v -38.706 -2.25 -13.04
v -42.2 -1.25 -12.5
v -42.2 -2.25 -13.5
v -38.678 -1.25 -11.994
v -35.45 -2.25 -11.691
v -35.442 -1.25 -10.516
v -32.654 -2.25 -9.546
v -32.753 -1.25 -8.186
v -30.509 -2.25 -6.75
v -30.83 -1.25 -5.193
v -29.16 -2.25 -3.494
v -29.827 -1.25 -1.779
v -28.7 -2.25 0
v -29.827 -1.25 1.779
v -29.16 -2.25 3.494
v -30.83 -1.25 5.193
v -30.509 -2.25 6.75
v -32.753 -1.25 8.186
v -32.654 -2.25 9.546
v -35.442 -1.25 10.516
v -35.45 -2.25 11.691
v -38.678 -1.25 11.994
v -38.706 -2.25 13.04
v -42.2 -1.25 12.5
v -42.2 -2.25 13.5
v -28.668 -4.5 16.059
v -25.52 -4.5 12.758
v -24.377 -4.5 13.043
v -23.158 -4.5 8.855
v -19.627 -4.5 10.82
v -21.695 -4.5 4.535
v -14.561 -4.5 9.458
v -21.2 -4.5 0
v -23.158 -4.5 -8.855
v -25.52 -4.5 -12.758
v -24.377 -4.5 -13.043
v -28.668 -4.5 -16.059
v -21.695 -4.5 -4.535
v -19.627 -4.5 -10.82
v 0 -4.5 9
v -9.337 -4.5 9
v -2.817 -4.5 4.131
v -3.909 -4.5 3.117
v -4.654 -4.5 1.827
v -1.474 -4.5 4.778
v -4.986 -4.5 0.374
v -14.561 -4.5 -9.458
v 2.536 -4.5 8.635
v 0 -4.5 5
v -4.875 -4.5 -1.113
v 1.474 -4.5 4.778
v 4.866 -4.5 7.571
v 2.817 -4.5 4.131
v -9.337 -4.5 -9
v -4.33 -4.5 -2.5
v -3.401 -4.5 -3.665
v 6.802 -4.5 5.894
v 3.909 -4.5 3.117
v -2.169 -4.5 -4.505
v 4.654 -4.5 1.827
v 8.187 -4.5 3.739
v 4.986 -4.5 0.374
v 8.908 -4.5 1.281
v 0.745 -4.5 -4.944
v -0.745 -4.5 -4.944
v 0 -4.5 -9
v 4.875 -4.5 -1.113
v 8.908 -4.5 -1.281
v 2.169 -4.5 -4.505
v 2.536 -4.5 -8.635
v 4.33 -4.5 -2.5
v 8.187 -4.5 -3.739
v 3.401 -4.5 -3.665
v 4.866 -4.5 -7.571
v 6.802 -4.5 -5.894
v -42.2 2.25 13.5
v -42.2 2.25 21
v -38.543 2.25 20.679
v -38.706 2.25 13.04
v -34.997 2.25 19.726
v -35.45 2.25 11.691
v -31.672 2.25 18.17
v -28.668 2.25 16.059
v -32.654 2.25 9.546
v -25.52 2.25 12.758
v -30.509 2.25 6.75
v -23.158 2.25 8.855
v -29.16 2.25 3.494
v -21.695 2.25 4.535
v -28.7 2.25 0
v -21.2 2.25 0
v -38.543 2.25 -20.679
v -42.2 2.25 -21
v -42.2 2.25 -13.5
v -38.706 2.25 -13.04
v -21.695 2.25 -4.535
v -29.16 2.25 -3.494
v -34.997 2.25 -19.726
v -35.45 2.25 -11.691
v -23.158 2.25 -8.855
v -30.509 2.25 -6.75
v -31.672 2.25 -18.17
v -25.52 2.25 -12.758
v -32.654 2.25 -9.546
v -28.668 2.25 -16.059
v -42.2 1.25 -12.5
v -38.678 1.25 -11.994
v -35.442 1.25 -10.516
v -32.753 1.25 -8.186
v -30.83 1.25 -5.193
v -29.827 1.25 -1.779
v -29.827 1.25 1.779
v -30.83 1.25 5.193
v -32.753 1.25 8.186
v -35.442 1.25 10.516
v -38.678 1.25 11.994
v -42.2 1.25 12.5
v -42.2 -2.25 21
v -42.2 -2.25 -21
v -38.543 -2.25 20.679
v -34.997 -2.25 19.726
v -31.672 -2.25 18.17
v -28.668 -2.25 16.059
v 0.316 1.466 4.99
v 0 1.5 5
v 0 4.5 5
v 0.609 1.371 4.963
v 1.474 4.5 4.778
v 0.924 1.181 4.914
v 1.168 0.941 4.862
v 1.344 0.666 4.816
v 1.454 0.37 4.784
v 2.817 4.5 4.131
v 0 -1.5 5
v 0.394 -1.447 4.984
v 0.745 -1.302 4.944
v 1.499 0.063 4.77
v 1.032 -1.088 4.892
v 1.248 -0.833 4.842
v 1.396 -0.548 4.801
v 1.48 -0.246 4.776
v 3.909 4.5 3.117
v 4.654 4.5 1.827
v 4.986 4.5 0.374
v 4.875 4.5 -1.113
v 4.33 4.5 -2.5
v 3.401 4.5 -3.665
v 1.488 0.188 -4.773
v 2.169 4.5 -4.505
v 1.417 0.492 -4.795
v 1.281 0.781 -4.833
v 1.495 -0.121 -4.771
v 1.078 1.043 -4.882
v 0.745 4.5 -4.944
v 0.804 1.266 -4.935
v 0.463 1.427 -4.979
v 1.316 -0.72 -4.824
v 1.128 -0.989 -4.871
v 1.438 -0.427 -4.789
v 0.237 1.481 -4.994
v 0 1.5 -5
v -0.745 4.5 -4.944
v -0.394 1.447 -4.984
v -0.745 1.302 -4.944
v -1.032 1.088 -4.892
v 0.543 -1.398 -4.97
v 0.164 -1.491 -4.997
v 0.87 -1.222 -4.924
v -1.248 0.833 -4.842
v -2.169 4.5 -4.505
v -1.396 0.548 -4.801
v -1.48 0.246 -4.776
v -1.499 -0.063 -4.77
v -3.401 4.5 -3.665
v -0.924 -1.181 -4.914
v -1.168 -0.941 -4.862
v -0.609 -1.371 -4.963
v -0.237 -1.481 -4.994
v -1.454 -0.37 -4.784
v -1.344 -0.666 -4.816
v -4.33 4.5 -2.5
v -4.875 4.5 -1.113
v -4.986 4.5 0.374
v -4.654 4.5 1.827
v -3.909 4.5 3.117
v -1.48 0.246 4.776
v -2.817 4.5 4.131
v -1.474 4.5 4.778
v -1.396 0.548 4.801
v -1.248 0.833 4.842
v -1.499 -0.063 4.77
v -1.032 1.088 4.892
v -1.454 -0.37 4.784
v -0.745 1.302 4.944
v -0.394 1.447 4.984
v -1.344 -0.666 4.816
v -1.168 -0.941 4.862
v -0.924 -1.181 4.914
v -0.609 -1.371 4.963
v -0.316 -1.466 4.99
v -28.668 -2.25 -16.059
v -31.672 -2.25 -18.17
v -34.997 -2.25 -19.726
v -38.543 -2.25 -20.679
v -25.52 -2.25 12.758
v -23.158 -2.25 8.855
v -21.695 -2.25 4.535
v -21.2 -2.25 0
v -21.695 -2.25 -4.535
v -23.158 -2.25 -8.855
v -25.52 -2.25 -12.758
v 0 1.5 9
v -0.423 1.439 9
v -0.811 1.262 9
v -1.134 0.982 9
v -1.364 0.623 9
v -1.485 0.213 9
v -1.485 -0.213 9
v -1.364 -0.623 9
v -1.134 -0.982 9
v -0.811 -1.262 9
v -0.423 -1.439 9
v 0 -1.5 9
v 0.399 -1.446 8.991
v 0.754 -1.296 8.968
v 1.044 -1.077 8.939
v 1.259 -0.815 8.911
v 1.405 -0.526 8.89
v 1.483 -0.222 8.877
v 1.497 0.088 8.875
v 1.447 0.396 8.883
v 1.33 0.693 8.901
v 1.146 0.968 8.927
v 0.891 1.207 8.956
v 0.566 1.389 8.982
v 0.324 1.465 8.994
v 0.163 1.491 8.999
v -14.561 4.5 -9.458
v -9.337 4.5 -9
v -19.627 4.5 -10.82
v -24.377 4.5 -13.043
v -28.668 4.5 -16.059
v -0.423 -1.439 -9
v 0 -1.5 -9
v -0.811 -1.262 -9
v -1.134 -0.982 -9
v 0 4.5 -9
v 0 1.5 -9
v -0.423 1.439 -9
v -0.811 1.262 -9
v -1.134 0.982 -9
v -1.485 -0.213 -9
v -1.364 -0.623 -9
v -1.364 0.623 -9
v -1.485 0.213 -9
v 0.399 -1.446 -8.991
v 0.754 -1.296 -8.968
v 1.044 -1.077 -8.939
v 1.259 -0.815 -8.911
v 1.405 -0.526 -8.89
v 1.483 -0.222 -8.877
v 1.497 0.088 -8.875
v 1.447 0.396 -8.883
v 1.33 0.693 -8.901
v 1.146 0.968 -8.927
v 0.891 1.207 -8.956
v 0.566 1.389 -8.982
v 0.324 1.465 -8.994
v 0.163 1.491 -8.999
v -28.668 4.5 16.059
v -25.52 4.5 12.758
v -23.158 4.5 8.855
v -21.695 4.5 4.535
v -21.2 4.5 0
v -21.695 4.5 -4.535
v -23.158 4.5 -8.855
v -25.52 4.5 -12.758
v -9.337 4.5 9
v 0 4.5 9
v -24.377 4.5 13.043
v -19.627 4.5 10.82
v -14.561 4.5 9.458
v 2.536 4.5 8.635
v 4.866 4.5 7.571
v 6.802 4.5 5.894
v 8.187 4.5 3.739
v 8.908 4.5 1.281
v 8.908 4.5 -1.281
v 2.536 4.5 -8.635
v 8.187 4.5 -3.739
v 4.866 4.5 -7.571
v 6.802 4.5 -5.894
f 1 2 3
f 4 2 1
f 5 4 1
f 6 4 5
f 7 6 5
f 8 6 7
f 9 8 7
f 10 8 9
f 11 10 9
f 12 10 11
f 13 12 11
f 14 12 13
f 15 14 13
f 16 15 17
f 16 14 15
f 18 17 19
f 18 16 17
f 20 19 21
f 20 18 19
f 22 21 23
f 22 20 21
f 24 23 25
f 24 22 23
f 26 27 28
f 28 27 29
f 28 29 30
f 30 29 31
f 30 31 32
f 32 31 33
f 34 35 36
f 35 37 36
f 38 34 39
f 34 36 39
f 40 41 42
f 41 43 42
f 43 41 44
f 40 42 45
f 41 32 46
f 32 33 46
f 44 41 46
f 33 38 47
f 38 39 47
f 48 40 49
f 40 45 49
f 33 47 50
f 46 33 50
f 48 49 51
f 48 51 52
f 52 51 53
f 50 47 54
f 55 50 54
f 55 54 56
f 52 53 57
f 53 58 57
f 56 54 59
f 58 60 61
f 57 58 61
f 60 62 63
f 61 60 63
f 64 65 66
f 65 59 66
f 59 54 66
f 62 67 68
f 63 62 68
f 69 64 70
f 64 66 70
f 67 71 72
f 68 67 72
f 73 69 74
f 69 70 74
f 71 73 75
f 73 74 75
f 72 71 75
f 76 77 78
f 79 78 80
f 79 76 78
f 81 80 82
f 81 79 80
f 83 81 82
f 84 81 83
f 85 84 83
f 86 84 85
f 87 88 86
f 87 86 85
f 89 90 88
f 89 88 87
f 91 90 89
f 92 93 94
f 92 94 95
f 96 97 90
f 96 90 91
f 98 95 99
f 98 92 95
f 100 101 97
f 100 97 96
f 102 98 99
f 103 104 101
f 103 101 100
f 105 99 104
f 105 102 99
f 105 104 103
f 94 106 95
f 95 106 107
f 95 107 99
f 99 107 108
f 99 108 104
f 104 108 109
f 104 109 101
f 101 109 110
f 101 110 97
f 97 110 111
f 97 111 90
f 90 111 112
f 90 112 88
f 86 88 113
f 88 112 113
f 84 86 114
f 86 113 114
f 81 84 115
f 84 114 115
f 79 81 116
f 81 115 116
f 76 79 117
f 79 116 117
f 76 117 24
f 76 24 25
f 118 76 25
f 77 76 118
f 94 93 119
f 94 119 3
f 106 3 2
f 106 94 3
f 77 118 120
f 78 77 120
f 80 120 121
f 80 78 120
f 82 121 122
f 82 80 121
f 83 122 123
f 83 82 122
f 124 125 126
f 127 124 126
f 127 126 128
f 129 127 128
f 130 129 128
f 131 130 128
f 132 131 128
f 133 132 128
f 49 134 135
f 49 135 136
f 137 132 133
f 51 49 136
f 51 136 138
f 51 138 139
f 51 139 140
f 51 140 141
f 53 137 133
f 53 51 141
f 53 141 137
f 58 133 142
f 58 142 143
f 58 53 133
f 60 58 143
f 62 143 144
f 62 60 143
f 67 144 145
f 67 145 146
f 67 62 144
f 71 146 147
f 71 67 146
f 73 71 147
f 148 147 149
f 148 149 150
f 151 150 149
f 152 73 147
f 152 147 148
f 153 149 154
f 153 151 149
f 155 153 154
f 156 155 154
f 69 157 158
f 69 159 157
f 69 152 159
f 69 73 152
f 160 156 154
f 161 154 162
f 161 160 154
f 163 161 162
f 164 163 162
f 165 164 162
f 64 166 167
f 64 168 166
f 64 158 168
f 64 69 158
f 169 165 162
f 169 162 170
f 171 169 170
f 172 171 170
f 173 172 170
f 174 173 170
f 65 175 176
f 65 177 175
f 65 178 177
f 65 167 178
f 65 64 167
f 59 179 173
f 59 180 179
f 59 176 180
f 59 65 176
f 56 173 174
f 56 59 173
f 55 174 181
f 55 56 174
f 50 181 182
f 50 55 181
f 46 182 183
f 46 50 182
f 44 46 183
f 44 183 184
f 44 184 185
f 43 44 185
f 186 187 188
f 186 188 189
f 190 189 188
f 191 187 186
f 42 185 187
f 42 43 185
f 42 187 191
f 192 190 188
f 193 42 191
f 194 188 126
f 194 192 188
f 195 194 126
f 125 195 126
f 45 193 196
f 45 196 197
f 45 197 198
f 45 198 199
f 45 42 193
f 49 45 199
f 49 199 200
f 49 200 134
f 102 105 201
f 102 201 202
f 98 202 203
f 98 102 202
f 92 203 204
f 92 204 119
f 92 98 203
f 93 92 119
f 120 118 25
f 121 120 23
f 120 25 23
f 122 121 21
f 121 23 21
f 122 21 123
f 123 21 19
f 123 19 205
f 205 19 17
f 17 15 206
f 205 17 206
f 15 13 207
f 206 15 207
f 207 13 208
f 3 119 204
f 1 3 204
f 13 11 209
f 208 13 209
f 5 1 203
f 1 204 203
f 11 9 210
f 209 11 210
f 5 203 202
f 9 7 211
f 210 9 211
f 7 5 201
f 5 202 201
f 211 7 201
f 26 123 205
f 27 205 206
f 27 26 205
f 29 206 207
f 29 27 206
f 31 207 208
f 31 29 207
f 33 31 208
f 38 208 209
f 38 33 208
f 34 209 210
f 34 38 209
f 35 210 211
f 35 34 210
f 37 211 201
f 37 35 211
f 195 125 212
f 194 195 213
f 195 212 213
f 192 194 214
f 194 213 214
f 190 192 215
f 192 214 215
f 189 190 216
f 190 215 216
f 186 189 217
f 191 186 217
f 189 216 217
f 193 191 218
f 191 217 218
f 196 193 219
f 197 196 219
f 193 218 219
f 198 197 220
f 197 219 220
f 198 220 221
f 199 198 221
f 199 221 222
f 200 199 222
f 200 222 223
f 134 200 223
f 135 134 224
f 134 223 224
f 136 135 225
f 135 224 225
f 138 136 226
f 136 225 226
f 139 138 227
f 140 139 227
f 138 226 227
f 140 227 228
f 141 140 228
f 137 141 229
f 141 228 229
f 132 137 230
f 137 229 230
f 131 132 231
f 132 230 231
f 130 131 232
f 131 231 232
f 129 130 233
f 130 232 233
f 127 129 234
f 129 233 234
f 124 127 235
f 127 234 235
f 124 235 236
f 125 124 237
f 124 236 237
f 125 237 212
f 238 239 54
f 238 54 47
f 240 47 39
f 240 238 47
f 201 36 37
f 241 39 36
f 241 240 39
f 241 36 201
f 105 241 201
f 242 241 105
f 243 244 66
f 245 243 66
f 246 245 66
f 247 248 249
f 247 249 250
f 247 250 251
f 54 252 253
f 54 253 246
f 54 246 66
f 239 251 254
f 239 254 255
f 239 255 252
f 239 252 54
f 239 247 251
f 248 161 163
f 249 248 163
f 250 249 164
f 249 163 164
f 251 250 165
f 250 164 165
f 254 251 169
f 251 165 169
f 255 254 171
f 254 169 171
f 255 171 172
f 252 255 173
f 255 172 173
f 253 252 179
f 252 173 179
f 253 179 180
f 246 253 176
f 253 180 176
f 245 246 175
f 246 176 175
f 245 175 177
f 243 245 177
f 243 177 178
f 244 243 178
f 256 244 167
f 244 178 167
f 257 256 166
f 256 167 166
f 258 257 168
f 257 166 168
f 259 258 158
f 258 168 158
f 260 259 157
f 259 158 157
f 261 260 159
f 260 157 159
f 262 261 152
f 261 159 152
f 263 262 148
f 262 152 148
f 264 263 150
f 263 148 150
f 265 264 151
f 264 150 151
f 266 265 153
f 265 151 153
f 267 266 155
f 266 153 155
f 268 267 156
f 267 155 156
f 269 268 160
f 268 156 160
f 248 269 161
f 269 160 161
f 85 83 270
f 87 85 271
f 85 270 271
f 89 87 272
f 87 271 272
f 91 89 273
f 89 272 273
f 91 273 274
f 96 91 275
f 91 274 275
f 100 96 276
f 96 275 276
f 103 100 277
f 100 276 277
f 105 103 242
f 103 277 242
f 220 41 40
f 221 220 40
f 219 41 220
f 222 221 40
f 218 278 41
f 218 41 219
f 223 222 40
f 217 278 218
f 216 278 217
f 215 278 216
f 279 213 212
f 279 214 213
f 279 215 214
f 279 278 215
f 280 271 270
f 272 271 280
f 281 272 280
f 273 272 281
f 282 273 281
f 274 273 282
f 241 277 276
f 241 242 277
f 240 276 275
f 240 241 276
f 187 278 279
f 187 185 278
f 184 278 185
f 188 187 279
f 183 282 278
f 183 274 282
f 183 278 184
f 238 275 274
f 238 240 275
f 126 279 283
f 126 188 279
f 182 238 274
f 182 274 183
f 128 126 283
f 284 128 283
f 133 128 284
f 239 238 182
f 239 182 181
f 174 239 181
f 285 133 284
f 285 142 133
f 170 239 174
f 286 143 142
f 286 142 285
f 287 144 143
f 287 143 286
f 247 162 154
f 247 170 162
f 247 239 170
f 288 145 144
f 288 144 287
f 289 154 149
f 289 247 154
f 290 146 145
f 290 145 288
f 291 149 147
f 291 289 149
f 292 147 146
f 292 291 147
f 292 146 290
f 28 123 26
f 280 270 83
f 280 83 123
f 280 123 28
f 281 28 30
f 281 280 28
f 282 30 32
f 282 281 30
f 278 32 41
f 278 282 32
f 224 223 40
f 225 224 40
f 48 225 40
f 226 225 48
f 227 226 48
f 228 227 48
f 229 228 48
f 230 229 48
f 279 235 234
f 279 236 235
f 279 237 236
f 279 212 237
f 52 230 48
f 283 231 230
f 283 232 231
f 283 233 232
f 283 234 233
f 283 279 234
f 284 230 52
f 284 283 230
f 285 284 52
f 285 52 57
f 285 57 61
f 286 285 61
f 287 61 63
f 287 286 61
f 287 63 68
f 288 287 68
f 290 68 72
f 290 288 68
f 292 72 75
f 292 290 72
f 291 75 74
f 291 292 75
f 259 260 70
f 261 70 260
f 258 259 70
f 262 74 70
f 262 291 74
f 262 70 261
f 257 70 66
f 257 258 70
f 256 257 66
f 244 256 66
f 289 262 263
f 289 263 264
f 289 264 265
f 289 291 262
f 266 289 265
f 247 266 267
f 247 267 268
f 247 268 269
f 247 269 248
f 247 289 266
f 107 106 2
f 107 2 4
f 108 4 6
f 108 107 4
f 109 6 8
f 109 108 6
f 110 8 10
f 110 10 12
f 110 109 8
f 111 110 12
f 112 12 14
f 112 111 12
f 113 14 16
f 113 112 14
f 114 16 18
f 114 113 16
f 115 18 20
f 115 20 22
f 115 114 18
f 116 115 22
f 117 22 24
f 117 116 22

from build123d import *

# Parameters (mm, degrees)
SKETCH_1_R          = 5
EXTRUDE_1_DEPTH     = 4.5
CUT_EXTRUDE_1_DEPTH = 2.25
CHAMFER_1_SIZE      = 1
SKETCH_3_R          = 1.5
CUT_EXTRUDE_2_DEPTH = 16.625


with BuildPart() as part:
    # 草图1 → 凸台-拉伸1 (new, symmetric)
    with BuildSketch(Plane(origin=(0, 0, 0), x_dir=(1, 0, 0), z_dir=(0, 1, 0))):
        with BuildLine():
            Line((0, 9), (-9.33664655, 9))
            ThreePointArc((-9.33664655, 9), (-19.626561658, 10.819906901), (-28.668030932, 16.058823529))
            ThreePointArc((-28.668030932, 16.058823529), (-34.997059424, 19.726065169), (-42.2, 21))
            Line((-42.2, 21), (-42.2, 12.5))
            ThreePointArc((-42.2, 12.5), (-29.7, 0), (-42.2, -12.5))
            Line((-42.2, -12.5), (-42.2, -21))
            ThreePointArc((-42.2, -21), (-34.997059424, -19.726065169), (-28.668030932, -16.058823529))
            ThreePointArc((-28.668030932, -16.058823529), (-19.626561658, -10.819906901), (-9.33664655, -9))
            Line((-9.33664655, -9), (0, -9))
            ThreePointArc((0, -9), (9, 0), (0, 9))
        make_face()
        with Locations(Location((0, 0, 0), (0, 0, 270))):
            Circle(SKETCH_1_R, mode=Mode.SUBTRACT)
    extrude(amount=EXTRUDE_1_DEPTH, both=True)

    # 草图2 → 切除-拉伸1 (cut)
    with BuildSketch(Plane(origin=(0, 4.5, 0), x_dir=(1, 0, 0), z_dir=(0, 1, 0))):
        with BuildLine():
            Line((-42.2, -12.5), (-42.2, -21))
            ThreePointArc((-42.2, -21), (-21.2, 0), (-42.2, 21))
            Line((-42.2, 21), (-42.2, 12.5))
            ThreePointArc((-42.2, 12.5), (-29.7, 0), (-42.2, -12.5))
        make_face()
    cut_extrude_1 = extrude(amount=-CUT_EXTRUDE_1_DEPTH, mode=Mode.SUBTRACT)

    # 镜向1: 切除-拉伸1 across plane
    add(cut_extrude_1.mirror(Plane.ZX), mode=Mode.SUBTRACT)

    # 倒角1
    chamfer_1_edges = [part.edges().sort_by_distance(p)[0] for p in [
        (-29.7, 2.25, 0),
        (-29.7, -2.25, 0),
    ]]
    chamfer(chamfer_1_edges, length=CHAMFER_1_SIZE)

    # 草图3 → 切除-拉伸2 (cut, symmetric)
    with BuildSketch(Plane.XY):
        with Locations(Location((0, 0, 0), (0, 0, 89.999999982))):
            Circle(SKETCH_3_R)
    extrude(amount=CUT_EXTRUDE_2_DEPTH, both=True, mode=Mode.SUBTRACT)


solid = part.part
